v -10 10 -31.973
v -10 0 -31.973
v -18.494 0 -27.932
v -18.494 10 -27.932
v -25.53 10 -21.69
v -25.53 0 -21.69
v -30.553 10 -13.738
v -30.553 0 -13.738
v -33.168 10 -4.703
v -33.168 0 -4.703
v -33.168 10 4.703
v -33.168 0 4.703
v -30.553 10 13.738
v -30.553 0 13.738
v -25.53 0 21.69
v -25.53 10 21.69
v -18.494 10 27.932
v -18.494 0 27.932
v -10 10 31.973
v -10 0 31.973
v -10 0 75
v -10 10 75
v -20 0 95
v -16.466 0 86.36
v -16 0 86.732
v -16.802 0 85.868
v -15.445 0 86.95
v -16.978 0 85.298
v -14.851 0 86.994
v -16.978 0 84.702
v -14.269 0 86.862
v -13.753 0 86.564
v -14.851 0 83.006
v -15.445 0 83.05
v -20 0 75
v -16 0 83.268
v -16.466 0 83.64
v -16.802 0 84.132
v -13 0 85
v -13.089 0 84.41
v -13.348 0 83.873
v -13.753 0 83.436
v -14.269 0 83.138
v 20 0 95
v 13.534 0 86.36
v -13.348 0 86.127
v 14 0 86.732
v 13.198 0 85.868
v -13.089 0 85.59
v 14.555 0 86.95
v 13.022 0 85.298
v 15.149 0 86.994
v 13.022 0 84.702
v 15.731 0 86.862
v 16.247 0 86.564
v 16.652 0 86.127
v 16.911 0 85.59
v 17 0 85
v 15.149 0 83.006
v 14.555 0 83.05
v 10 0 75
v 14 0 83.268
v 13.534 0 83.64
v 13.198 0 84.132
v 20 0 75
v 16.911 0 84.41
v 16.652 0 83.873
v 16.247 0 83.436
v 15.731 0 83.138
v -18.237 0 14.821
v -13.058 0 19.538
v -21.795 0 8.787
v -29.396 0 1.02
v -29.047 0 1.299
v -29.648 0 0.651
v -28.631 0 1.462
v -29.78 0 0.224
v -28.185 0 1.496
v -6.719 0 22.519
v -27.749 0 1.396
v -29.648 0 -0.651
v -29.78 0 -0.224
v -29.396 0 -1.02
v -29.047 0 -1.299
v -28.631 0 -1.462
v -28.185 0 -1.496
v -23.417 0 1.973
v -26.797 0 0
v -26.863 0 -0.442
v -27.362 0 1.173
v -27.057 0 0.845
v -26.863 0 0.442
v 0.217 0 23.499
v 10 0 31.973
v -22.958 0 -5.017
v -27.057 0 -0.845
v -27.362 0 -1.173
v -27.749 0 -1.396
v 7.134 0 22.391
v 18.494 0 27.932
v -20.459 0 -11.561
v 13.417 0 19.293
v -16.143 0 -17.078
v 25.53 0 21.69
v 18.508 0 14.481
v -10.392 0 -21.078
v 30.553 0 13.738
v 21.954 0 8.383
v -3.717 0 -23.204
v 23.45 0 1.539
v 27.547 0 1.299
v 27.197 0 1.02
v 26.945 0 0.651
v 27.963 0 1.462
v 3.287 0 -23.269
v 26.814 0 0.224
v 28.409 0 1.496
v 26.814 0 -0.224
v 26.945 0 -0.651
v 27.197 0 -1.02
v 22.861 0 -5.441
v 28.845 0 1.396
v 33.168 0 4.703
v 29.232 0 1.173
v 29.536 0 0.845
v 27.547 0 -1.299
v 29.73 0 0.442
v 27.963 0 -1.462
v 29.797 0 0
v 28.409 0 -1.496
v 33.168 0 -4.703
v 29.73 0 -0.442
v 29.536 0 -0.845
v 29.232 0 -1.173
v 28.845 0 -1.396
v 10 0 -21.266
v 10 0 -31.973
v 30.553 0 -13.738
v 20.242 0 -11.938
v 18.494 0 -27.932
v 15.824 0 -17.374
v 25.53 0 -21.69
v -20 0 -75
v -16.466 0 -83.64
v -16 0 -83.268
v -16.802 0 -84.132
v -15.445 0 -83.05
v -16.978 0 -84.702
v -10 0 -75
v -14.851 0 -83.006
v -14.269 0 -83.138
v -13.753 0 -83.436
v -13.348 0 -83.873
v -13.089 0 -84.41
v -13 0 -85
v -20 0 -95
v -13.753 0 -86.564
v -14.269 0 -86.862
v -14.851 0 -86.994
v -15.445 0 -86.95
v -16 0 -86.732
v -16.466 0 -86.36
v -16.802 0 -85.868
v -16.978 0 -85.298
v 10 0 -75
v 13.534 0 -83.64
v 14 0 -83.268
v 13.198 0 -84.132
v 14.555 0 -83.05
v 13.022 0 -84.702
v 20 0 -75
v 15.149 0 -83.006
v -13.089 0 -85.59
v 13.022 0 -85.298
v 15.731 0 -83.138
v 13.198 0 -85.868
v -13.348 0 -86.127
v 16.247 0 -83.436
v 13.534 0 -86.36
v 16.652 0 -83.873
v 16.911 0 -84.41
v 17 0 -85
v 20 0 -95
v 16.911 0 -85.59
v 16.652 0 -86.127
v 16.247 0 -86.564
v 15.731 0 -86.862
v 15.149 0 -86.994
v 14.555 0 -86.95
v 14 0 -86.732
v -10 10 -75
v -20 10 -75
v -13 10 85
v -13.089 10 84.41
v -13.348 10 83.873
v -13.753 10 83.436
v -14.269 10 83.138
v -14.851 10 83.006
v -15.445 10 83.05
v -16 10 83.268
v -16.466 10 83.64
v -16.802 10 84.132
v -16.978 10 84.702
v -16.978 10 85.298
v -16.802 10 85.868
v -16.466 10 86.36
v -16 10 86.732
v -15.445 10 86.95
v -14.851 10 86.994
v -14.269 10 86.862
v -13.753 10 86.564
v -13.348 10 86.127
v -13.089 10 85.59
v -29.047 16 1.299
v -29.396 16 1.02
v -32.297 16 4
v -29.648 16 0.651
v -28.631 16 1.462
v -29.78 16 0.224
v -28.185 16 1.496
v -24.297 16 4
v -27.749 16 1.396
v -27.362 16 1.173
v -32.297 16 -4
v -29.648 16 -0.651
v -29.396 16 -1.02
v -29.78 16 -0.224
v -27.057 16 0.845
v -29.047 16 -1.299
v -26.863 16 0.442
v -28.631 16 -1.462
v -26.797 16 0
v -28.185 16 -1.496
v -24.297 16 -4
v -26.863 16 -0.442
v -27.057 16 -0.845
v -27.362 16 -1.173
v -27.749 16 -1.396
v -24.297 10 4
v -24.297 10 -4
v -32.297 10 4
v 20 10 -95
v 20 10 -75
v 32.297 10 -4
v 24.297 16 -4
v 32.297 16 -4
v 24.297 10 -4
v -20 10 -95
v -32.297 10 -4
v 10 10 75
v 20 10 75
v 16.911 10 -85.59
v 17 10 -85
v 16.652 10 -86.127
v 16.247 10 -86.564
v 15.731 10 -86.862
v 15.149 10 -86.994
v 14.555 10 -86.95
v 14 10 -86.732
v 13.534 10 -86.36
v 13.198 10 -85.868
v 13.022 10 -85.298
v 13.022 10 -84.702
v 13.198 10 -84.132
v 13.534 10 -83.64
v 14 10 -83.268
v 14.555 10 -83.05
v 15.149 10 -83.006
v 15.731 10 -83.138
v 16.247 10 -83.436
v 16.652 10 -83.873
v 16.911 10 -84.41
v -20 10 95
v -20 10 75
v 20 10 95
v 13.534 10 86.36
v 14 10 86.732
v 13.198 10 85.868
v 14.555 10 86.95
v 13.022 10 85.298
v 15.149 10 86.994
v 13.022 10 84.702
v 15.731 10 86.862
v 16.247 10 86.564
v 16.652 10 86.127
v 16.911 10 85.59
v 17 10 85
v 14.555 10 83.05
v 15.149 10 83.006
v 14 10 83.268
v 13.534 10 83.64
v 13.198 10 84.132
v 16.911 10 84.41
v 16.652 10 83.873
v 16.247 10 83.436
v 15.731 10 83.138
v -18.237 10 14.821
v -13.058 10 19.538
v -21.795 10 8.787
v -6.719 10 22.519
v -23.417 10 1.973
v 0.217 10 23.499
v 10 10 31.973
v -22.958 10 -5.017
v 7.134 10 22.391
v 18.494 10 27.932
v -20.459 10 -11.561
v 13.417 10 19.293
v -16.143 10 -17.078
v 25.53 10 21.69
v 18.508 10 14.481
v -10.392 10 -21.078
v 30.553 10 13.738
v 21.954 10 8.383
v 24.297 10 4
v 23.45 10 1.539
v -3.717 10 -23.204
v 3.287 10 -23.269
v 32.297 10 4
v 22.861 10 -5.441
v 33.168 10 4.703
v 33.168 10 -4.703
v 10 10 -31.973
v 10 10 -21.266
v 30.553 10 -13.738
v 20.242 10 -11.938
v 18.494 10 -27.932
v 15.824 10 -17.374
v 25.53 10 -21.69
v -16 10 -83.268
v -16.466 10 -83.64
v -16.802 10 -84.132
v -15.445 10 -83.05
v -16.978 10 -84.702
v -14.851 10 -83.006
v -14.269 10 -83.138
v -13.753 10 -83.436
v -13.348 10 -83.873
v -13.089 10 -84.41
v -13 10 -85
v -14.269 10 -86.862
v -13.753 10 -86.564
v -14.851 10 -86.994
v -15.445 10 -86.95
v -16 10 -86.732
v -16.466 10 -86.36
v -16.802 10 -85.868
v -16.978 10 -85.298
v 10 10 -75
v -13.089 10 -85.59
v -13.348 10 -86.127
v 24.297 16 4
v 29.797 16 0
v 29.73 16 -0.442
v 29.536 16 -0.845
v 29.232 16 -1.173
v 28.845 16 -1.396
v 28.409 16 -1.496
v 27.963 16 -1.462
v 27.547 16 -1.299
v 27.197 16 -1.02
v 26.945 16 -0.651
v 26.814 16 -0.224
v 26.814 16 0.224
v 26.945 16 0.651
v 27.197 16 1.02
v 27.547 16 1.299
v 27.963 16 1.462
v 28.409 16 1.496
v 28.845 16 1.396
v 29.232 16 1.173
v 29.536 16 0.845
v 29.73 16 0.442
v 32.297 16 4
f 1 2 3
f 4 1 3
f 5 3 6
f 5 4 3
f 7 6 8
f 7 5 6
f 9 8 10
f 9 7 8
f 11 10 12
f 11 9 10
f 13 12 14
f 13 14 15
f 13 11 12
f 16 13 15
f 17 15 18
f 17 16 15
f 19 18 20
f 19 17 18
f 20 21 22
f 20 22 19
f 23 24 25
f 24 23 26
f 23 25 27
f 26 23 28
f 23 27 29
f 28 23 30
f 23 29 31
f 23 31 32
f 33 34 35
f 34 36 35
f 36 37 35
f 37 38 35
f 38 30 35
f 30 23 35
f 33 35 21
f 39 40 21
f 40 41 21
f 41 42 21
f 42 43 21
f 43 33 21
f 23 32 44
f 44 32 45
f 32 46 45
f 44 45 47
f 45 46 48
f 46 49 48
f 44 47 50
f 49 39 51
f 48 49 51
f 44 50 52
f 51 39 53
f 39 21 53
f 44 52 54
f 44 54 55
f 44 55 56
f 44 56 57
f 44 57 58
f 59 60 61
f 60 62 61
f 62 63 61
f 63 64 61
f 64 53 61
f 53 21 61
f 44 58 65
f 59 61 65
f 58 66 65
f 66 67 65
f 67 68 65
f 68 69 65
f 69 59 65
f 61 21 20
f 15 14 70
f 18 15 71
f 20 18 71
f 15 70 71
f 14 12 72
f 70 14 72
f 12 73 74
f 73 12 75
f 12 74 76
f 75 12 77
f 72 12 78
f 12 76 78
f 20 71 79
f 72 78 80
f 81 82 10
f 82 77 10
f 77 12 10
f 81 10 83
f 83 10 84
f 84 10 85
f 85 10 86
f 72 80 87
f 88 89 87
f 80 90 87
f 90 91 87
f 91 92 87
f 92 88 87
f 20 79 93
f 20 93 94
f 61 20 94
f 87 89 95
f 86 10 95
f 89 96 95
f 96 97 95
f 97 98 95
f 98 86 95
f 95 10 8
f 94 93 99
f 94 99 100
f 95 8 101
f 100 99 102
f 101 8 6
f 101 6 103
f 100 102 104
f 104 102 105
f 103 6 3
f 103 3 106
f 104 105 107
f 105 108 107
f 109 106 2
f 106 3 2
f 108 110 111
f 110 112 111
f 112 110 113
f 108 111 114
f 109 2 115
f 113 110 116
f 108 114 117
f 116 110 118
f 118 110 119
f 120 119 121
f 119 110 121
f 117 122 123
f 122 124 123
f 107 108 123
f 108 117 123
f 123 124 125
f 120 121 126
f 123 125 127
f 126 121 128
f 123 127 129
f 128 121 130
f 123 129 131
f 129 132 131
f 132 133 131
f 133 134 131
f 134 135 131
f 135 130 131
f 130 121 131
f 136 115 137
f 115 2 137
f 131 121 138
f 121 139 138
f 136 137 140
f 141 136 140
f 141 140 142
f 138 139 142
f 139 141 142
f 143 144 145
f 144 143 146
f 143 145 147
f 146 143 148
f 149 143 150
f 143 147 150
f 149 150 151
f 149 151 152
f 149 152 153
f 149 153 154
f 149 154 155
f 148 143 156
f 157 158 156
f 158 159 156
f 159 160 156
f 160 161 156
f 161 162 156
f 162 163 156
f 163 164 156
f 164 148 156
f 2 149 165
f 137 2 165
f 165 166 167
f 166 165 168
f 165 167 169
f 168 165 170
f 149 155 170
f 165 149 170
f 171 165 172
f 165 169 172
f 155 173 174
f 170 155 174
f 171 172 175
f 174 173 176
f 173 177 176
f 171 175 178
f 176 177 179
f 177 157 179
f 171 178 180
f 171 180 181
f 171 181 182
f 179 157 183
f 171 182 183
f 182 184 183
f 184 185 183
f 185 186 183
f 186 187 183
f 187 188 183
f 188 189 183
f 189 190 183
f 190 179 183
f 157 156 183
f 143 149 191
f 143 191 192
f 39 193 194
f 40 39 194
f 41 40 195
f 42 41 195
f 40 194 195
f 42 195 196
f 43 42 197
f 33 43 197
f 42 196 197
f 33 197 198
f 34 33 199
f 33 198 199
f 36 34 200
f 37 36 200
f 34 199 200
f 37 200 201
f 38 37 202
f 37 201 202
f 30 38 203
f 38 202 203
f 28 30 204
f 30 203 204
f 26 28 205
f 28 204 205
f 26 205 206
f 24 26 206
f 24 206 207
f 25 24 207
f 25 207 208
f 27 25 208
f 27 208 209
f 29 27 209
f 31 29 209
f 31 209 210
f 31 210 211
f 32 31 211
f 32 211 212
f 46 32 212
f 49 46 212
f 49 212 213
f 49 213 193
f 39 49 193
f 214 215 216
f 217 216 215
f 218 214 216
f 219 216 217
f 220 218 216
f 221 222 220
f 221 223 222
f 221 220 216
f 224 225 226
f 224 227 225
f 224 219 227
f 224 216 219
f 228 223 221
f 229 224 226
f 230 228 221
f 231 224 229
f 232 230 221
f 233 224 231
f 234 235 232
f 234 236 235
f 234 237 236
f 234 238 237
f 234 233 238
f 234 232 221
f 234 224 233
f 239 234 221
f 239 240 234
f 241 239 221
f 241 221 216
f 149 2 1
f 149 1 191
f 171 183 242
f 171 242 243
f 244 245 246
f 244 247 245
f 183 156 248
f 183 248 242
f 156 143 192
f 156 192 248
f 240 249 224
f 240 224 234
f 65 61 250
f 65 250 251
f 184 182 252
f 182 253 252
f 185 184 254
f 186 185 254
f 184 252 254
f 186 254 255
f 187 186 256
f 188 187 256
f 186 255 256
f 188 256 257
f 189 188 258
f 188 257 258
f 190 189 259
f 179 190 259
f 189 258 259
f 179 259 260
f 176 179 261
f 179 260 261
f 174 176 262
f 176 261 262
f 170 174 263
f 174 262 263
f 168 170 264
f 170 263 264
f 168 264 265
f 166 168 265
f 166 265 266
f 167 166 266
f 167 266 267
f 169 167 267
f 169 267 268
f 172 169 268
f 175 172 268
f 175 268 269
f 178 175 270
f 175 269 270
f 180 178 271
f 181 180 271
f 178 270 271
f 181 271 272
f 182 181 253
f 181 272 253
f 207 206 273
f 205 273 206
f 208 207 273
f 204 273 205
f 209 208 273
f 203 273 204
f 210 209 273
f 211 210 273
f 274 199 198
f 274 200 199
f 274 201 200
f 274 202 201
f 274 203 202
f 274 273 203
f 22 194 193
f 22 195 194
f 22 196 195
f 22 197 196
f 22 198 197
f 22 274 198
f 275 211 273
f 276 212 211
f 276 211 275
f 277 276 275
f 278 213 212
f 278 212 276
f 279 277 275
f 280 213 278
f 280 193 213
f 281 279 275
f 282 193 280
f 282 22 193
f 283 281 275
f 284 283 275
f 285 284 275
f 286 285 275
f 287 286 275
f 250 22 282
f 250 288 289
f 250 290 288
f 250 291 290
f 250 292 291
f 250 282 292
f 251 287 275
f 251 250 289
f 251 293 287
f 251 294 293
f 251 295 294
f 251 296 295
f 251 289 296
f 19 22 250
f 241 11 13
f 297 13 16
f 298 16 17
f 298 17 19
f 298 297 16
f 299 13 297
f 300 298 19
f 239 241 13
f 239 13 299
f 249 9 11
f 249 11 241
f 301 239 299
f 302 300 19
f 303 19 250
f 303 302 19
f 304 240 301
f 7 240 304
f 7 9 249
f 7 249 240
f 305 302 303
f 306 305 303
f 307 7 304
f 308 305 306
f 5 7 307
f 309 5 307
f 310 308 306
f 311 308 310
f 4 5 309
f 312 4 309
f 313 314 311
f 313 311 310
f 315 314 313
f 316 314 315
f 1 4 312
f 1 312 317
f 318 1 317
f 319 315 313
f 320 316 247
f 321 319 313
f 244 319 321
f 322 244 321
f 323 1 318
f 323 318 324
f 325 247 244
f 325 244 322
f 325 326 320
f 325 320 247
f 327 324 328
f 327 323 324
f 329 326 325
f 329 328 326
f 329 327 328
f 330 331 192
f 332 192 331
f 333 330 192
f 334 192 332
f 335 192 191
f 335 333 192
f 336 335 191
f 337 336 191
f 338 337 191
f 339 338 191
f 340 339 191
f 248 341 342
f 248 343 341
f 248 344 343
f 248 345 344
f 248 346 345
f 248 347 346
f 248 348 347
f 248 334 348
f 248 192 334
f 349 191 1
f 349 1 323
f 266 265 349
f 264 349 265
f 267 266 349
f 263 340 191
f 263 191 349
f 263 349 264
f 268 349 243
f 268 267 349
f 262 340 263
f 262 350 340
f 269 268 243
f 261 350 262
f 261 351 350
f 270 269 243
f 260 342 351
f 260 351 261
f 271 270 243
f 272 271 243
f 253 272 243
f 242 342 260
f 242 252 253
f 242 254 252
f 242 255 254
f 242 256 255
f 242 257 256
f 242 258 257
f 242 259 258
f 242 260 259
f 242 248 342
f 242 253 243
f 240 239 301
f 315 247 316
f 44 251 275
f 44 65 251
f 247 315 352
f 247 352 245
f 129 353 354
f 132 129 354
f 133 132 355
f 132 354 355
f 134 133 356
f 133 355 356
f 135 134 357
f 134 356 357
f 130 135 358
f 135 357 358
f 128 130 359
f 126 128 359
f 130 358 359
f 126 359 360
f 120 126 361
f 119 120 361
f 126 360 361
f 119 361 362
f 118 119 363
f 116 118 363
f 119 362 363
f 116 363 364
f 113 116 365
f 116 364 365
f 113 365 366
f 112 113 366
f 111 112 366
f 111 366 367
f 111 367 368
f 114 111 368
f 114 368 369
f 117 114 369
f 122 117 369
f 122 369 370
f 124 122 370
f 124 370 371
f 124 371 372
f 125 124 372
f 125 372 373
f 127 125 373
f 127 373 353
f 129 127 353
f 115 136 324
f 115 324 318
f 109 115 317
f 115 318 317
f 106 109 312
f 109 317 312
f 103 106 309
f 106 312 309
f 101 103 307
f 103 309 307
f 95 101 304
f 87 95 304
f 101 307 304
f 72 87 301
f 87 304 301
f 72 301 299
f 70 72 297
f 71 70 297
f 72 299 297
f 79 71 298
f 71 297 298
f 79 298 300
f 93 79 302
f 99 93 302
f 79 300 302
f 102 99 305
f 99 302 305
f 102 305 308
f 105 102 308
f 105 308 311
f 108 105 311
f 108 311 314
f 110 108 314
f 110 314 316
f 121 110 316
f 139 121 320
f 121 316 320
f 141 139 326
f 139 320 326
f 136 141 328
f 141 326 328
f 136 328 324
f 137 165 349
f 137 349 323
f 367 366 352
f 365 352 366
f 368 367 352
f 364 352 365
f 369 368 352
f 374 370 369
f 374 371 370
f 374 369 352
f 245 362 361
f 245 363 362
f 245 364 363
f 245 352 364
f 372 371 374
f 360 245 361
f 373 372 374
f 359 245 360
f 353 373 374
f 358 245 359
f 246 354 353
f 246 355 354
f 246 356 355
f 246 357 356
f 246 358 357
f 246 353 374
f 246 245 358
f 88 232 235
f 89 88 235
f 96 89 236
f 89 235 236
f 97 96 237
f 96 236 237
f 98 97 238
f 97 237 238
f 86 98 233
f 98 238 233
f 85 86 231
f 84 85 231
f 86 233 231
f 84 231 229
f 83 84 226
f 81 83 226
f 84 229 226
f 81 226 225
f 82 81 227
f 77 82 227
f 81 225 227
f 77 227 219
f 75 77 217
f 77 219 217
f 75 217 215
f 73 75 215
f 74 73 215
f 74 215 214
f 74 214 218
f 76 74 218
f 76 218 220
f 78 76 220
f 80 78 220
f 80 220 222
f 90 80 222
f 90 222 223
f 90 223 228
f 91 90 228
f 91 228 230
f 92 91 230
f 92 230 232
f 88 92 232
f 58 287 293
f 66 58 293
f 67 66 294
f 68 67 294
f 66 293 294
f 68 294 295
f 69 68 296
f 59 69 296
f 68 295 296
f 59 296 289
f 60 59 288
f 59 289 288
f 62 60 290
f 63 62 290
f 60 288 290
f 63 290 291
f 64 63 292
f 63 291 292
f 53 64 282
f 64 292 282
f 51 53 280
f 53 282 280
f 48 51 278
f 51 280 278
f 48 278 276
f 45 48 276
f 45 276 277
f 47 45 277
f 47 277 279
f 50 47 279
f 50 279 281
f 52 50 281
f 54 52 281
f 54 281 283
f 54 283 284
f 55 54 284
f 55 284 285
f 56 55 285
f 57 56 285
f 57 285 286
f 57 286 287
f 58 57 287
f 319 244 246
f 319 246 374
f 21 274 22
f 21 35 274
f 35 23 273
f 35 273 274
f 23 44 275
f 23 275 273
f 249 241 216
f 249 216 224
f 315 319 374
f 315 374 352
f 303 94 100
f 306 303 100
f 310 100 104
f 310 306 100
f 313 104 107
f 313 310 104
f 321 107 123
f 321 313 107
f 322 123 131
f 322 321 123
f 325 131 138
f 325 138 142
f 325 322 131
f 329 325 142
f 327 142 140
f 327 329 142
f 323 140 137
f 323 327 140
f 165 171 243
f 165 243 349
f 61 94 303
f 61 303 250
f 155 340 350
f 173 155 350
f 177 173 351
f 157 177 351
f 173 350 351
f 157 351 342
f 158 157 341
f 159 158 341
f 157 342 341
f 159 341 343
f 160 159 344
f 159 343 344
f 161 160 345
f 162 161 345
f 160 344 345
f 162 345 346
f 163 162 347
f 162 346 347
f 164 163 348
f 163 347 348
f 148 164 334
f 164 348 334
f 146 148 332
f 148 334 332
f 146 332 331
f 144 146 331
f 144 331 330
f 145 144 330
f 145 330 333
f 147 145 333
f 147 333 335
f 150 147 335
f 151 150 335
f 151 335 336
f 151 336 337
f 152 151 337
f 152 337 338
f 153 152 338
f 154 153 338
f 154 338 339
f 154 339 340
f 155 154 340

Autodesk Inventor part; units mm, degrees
ref_plane "YZ Plane" through (0, 0, 0) normal (1, 0, 0) x (0, 1, 0)
ref_plane "XZ Plane" through (0, 0, 0) normal (0, 1, 0) x (-1, 0, 0)
ref_plane "XY Plane" through (0, 0, 0) normal (0, 0, 1) x (1, 0, 0)
sketch "Sketch1" plane through (0, 0, 0) normal (0, 1, 0) x (-1, 0, 0)
  line L0 (-10, 95) -> (10, 95)
  line L1 (10, 95) -> (10, -95)
  line L2 (10, -95) -> (-10, -95)
  line L3 (-10, -95) -> (-10, 95)
  line L4 (-10, 95) -> (10, -95) construction
  line L5 (10, 95) -> (-10, -95) construction
  line L6 (20, -95) -> (-20, -95)
  line L7 (-20, -95) -> (-20, -75)
  line L8 (-20, -75) -> (20, -75)
  line L9 (20, -75) -> (20, -95)
  line L10 (-20, 95) -> (20, 95)
  line L11 (20, 95) -> (20, 75)
  line L12 (20, 75) -> (-20, 75)
  line L13 (-20, 75) -> (-20, 95)
  point P0 (0, 0)
  point P1 (-10, 75)
  point P2 (-10, -75)
  point P3 (10, -75)
  point P4 (10, 75)
  dimension "d0" = 20
  dimension "d1" = 190
  dimension "d2" = 40
  dimension "d3" = 20
  dimension "d4" = 40
  dimension "d5" = 20
extrude "Extrusion1" add sketch "Sketch1" along normal blind 10
sketch "Sketch2" plane through (0, 10, 0) normal (0, 1, 0) x (1, 0, 0)
  circle A0 centre (0, 0) radius 23.5
  circle A1 centre (0, 0) radius 33.5
  dimension "d8" = 47
  dimension "d9" = 67
extrude "Extrusion2" add sketch "Sketch2" against normal blind 10
sketch "Sketch3" plane through (0, 10, 0) normal (0, 1, 0) x (1, 0, 0)
  circle A0 centre (0, 0) radius 23.5
extrude "Extrusion3" cut sketch "Sketch3" against normal blind 10
sketch "Sketch4" plane through (0, 10, 0) normal (0, 1, 0) x (1, 0, 0)
  circle A0 centre (-15, -85) radius 2
  circle A1 centre (15, -85) radius 2
  circle A2 centre (-15, 85) radius 2
  circle A3 centre (15, 85) radius 2
  point P0 (0, 0)
  dimension "d14" = 4
  dimension "d15" = 4
  dimension "d16" = 4
  dimension "d17" = 4
extrude "Extrusion4" cut sketch "Sketch4" against normal blind 10
sketch "Sketch5" plane through (0, 10, 0) normal (0, 1, 0) x (1, 0, 0)
  line L0 (24.2968, 4) -> (32.2968, 4)
  line L1 (32.2968, 4) -> (32.2968, -4)
  line L2 (32.2968, -4) -> (24.2968, -4)
  line L3 (24.2968, -4) -> (24.2968, 4)
  line L4 (24.2968, 4) -> (32.2968, -4) construction
  line L5 (32.2968, 4) -> (24.2968, -4) construction
  line L6 (-32.2968, -4) -> (-32.2968, 4)
  line L7 (-32.2968, 4) -> (-24.2968, 4)
  line L8 (-24.2968, 4) -> (-24.2968, -4)
  line L9 (-24.2968, -4) -> (-32.2968, -4)
  point P0 (0, 0)
  point P1 (28.2968, 0)
  point P2 (-28.2968, 0)
  dimension "d20" = 8
  dimension "d21" = 8
  dimension "d24" = 360
extrude "Extrusion5" add sketch "Sketch5" along normal blind 6
sketch "Sketch6" plane through (0, 16, 0) normal (0, 1, 0) x (1, 0, 0)
  line L0 (24.2968, 4) -> (24.2968, -4) projected
  line L1 (32.2968, 4) -> (24.2968, 4)
  line L2 (24.2968, 4) -> (24.2968, -4)
  line L3 (24.2968, -4) -> (32.2968, -4)
  line L4 (32.2968, -4) -> (32.2968, 4)
  circle A0 centre (28.2968, 0) radius 1.5
  circle A1 centre (-28.2968, 0) radius 1.5
  point P0 (0, 0)
  dimension "d28" = 3
  dimension "d31" = 360
extrude "Extrusion6" cut sketch "Sketch6" against normal through all contours A0 | A1
properties part number "upper_grip"
